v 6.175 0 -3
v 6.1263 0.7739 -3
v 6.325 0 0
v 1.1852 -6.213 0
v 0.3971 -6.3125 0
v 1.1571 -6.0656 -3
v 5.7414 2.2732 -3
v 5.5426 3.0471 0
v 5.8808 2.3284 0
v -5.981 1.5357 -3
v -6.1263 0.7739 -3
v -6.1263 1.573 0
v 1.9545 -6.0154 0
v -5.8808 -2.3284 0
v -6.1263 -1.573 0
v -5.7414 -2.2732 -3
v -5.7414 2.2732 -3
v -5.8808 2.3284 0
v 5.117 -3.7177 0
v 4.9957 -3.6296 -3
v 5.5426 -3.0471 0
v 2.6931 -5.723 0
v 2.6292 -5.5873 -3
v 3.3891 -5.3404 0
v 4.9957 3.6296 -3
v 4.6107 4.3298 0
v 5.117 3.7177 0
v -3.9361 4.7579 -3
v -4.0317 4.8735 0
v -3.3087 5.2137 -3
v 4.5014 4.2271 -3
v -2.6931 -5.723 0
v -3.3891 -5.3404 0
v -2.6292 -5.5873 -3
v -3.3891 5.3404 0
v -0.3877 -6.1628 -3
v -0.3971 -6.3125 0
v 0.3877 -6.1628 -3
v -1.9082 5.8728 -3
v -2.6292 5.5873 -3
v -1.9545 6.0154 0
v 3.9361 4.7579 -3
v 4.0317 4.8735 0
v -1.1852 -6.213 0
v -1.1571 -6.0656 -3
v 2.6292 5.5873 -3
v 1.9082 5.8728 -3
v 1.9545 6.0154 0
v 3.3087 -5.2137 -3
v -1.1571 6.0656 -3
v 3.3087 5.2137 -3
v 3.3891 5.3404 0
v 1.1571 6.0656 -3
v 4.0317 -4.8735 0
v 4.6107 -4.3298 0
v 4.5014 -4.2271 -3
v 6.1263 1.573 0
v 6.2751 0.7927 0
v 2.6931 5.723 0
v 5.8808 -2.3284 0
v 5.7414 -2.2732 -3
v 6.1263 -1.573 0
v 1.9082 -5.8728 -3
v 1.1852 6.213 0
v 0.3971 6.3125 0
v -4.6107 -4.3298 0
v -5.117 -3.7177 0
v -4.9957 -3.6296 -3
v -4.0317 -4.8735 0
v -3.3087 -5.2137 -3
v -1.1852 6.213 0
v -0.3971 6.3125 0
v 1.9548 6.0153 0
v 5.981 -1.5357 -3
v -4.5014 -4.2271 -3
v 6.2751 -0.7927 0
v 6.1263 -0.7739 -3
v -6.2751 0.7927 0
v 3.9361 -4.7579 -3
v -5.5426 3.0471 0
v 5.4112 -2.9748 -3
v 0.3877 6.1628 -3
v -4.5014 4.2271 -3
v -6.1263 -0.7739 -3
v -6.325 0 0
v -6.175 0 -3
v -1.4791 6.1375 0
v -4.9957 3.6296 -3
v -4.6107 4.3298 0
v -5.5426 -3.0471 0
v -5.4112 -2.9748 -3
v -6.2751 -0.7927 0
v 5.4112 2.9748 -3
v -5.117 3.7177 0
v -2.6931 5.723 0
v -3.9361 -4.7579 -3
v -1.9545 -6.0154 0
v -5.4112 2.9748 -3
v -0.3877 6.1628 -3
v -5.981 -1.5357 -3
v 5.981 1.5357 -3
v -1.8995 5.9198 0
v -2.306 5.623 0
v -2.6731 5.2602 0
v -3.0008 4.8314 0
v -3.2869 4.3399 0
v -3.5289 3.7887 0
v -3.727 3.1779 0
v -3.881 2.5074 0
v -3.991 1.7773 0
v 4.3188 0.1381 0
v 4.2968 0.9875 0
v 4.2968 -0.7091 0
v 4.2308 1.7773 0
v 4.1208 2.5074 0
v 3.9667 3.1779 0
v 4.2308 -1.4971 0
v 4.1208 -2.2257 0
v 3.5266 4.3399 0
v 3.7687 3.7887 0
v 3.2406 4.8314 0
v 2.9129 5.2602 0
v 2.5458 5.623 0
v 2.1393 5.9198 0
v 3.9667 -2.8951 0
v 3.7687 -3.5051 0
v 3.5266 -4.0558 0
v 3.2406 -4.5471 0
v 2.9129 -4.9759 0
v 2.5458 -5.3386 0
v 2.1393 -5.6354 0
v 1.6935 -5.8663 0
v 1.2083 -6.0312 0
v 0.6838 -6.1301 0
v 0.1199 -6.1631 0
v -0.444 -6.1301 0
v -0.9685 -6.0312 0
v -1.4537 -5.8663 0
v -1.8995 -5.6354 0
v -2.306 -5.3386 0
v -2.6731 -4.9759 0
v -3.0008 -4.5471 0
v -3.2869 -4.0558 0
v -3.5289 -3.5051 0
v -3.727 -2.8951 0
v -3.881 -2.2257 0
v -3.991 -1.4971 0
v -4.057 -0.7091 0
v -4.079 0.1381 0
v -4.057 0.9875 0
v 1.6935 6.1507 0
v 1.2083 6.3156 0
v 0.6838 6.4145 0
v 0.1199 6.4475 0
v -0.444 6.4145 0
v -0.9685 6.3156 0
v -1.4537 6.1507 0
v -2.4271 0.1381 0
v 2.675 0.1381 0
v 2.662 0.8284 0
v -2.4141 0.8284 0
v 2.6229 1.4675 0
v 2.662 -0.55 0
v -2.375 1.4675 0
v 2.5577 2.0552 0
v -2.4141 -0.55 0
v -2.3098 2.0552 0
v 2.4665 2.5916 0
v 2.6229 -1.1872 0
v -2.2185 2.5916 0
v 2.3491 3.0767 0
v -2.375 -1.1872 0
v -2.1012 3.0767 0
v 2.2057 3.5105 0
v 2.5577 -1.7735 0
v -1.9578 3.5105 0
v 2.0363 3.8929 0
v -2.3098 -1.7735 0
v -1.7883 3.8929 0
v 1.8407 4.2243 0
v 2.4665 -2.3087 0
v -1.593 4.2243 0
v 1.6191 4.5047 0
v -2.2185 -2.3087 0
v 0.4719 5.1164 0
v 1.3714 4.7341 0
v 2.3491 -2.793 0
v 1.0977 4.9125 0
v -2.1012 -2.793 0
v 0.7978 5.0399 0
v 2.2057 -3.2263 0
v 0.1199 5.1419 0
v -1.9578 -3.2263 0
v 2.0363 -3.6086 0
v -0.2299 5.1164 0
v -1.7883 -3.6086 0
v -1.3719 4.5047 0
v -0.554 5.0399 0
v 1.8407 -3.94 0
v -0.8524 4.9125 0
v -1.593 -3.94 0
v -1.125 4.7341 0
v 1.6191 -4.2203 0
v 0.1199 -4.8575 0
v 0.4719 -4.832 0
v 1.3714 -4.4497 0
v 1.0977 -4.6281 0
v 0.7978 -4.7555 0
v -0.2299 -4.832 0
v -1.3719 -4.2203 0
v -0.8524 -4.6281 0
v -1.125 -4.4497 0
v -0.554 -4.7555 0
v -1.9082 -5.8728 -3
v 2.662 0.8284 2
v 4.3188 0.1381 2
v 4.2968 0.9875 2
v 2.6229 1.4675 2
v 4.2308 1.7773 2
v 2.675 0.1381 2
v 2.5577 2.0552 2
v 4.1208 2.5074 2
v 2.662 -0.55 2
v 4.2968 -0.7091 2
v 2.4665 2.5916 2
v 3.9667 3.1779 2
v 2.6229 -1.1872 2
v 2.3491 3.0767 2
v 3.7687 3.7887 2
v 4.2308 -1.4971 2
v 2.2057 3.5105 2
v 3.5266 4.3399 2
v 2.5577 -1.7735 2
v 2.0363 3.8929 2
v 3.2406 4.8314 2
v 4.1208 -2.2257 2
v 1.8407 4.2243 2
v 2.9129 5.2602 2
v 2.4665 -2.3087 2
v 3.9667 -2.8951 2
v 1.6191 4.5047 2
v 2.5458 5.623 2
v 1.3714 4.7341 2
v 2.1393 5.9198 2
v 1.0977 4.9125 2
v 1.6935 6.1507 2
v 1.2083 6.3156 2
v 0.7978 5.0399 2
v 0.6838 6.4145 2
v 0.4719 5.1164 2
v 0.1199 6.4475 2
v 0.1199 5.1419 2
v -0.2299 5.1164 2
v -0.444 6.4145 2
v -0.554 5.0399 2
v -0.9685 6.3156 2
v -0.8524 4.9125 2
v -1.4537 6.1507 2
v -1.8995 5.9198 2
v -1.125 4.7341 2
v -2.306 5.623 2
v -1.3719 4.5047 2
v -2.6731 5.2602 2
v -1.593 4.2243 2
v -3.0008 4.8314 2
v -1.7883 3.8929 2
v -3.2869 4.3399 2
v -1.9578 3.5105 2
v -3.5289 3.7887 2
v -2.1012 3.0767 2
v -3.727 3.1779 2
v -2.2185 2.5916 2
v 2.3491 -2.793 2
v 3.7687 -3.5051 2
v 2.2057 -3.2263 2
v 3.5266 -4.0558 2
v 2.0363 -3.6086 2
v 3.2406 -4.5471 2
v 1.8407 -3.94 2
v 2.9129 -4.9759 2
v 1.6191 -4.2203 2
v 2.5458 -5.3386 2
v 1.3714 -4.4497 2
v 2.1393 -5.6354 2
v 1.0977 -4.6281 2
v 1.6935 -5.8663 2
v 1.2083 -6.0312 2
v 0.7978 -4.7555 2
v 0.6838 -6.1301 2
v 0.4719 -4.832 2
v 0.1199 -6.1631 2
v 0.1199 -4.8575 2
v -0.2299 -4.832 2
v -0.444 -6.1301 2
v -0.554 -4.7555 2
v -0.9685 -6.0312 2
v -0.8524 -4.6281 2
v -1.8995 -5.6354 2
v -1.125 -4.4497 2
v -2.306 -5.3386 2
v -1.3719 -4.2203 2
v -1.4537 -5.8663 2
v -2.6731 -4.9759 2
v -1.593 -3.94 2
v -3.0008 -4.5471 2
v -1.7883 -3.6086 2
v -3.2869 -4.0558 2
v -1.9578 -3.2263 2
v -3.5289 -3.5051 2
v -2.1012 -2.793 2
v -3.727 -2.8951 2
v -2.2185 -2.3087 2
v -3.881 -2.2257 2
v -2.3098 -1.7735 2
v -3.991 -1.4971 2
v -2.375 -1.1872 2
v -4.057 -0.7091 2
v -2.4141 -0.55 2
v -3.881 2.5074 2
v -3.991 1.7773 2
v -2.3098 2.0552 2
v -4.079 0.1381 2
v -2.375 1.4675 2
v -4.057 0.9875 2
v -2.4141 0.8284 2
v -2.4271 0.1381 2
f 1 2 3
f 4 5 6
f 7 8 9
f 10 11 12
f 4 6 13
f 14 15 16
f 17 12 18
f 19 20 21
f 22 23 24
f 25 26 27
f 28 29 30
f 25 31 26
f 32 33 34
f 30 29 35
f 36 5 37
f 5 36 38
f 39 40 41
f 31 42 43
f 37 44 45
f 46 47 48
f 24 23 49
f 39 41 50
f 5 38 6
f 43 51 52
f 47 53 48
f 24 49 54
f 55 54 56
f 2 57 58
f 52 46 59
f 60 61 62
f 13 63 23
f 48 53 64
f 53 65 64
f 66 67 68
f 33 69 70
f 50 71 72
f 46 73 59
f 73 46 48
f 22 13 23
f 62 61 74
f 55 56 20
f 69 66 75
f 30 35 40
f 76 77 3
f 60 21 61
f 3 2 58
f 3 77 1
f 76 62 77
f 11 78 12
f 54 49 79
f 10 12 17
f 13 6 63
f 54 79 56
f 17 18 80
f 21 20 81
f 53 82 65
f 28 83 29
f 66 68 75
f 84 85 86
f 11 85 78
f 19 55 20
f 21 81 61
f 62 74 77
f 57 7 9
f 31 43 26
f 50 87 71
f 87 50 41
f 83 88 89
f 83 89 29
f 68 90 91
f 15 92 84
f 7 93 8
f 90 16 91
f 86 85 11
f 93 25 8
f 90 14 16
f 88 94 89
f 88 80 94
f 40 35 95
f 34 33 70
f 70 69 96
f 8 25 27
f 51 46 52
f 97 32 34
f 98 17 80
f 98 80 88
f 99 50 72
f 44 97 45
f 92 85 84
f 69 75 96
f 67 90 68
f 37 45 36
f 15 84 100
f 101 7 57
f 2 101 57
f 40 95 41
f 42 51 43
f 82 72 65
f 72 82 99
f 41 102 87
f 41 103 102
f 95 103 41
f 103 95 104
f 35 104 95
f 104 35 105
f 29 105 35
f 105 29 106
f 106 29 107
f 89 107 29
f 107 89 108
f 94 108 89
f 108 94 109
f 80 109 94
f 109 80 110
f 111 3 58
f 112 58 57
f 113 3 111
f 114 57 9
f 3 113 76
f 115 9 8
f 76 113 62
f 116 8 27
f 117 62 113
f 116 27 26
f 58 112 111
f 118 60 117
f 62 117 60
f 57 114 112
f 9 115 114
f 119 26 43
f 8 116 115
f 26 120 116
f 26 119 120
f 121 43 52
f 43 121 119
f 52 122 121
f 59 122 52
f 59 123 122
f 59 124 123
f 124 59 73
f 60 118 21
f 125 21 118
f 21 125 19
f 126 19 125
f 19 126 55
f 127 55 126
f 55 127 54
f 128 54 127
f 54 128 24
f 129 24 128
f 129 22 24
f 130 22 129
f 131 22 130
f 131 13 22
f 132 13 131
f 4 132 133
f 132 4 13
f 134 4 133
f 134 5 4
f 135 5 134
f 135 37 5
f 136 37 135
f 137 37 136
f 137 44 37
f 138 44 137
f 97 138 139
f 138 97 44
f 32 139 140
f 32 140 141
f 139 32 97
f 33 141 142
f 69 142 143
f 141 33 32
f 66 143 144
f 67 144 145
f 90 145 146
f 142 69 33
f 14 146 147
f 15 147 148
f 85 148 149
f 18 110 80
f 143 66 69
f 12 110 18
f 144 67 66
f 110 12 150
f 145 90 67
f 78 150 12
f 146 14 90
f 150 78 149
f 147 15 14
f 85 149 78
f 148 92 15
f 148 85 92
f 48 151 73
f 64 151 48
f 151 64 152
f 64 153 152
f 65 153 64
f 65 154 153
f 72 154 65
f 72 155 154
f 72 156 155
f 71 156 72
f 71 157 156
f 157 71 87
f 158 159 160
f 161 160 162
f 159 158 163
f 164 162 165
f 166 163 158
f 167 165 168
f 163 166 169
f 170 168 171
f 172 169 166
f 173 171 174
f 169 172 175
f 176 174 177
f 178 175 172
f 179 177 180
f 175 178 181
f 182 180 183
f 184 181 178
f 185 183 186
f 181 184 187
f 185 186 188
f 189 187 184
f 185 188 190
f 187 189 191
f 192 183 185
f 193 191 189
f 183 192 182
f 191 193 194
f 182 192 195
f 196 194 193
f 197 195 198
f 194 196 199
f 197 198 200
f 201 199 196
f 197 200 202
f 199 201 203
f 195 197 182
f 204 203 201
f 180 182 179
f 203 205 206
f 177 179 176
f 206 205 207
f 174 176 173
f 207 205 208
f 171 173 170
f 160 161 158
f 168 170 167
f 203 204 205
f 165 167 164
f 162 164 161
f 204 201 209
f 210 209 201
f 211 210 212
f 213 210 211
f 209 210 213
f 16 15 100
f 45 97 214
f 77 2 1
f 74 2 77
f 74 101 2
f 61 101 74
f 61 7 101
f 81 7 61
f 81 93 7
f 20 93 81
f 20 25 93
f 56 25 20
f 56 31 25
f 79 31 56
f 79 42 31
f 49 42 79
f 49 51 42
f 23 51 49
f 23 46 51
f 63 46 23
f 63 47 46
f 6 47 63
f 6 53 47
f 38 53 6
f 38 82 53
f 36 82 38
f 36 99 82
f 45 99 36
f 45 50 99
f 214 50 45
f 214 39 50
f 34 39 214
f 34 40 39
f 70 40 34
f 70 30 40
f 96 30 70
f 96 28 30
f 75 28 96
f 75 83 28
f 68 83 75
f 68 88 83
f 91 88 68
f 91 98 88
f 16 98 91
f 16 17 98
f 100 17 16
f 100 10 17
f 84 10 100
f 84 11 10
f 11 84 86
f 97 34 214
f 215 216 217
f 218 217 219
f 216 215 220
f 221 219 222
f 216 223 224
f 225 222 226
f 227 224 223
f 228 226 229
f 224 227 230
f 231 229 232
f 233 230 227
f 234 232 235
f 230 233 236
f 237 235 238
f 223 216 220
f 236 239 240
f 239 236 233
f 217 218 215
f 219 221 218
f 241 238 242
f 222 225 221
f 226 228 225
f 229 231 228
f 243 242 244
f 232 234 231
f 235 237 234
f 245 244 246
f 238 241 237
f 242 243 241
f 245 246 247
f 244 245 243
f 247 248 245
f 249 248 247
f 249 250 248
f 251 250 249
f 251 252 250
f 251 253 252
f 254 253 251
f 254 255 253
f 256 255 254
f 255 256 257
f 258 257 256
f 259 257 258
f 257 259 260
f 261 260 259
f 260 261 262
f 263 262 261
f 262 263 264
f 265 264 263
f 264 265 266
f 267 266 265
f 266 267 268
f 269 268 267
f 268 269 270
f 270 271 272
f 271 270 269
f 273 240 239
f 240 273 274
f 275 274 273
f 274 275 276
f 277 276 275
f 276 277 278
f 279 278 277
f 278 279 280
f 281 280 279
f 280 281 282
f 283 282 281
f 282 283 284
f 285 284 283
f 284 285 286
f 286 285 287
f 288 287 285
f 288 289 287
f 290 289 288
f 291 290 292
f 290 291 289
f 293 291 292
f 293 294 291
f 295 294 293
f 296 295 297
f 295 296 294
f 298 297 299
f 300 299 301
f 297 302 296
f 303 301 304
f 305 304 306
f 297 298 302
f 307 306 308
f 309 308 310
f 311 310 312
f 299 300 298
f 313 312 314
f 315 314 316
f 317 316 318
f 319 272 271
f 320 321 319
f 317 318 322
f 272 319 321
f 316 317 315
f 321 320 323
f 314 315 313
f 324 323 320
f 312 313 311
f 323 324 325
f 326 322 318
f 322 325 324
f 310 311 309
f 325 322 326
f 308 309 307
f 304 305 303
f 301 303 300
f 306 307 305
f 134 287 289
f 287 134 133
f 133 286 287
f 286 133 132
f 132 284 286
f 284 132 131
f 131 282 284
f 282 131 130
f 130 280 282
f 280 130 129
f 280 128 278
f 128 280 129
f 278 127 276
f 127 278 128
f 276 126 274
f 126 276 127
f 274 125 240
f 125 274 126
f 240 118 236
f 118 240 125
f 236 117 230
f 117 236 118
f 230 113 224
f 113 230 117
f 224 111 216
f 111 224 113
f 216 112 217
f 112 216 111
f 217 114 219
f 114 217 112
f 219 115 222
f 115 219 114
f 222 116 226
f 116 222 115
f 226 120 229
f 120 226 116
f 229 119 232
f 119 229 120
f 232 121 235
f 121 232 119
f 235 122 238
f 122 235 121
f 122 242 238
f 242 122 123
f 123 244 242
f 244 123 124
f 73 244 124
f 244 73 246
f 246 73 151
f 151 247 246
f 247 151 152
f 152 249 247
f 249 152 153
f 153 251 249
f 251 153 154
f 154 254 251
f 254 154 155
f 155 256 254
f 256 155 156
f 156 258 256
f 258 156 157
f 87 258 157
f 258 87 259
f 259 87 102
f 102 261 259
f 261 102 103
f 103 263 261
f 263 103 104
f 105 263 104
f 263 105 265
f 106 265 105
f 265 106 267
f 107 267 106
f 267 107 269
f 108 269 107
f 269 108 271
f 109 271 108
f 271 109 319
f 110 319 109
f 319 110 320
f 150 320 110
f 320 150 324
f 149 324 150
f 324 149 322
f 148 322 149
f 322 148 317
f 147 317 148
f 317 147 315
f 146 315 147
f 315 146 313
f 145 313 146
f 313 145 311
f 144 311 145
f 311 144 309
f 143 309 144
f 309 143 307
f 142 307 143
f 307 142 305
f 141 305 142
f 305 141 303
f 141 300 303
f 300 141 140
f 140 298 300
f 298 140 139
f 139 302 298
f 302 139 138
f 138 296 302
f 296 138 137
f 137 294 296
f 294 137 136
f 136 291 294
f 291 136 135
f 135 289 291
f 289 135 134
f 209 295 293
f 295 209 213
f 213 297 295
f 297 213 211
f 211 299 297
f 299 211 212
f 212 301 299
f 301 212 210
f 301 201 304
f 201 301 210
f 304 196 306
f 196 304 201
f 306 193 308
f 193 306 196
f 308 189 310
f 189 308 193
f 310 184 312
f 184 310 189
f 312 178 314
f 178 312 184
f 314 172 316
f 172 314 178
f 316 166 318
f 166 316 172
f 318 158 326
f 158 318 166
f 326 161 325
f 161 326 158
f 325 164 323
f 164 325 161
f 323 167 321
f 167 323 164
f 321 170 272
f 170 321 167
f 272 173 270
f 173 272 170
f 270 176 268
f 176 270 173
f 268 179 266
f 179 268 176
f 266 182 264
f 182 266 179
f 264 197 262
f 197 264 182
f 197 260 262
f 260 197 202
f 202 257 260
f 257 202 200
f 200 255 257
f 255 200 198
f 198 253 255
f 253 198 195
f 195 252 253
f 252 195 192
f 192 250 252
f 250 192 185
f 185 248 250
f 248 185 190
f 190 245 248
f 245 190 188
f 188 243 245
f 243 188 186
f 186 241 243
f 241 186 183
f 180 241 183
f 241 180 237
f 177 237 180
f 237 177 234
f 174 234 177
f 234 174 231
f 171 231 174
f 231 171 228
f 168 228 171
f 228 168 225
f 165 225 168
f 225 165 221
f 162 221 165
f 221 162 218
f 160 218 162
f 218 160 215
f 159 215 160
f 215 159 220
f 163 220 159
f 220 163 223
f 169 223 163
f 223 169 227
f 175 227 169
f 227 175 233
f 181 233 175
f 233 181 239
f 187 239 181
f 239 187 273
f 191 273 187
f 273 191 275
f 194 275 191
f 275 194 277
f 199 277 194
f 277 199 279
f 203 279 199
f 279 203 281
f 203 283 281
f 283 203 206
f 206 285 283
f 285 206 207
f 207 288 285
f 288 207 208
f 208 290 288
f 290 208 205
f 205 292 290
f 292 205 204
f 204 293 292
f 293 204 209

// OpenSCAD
$fn = 50;


difference() {
	union() {
		translate(v = [0, 0, -3.0000000000]) {
			cylinder(h = 3, r1 = 6.1750000000, r2 = 6.3250000000);
		}
		linear_extrude(height = 2) {
			text(font = "Impact", halign = "center", size = 12, text = "0", valign = "center");
		}
	}
	union();
}
